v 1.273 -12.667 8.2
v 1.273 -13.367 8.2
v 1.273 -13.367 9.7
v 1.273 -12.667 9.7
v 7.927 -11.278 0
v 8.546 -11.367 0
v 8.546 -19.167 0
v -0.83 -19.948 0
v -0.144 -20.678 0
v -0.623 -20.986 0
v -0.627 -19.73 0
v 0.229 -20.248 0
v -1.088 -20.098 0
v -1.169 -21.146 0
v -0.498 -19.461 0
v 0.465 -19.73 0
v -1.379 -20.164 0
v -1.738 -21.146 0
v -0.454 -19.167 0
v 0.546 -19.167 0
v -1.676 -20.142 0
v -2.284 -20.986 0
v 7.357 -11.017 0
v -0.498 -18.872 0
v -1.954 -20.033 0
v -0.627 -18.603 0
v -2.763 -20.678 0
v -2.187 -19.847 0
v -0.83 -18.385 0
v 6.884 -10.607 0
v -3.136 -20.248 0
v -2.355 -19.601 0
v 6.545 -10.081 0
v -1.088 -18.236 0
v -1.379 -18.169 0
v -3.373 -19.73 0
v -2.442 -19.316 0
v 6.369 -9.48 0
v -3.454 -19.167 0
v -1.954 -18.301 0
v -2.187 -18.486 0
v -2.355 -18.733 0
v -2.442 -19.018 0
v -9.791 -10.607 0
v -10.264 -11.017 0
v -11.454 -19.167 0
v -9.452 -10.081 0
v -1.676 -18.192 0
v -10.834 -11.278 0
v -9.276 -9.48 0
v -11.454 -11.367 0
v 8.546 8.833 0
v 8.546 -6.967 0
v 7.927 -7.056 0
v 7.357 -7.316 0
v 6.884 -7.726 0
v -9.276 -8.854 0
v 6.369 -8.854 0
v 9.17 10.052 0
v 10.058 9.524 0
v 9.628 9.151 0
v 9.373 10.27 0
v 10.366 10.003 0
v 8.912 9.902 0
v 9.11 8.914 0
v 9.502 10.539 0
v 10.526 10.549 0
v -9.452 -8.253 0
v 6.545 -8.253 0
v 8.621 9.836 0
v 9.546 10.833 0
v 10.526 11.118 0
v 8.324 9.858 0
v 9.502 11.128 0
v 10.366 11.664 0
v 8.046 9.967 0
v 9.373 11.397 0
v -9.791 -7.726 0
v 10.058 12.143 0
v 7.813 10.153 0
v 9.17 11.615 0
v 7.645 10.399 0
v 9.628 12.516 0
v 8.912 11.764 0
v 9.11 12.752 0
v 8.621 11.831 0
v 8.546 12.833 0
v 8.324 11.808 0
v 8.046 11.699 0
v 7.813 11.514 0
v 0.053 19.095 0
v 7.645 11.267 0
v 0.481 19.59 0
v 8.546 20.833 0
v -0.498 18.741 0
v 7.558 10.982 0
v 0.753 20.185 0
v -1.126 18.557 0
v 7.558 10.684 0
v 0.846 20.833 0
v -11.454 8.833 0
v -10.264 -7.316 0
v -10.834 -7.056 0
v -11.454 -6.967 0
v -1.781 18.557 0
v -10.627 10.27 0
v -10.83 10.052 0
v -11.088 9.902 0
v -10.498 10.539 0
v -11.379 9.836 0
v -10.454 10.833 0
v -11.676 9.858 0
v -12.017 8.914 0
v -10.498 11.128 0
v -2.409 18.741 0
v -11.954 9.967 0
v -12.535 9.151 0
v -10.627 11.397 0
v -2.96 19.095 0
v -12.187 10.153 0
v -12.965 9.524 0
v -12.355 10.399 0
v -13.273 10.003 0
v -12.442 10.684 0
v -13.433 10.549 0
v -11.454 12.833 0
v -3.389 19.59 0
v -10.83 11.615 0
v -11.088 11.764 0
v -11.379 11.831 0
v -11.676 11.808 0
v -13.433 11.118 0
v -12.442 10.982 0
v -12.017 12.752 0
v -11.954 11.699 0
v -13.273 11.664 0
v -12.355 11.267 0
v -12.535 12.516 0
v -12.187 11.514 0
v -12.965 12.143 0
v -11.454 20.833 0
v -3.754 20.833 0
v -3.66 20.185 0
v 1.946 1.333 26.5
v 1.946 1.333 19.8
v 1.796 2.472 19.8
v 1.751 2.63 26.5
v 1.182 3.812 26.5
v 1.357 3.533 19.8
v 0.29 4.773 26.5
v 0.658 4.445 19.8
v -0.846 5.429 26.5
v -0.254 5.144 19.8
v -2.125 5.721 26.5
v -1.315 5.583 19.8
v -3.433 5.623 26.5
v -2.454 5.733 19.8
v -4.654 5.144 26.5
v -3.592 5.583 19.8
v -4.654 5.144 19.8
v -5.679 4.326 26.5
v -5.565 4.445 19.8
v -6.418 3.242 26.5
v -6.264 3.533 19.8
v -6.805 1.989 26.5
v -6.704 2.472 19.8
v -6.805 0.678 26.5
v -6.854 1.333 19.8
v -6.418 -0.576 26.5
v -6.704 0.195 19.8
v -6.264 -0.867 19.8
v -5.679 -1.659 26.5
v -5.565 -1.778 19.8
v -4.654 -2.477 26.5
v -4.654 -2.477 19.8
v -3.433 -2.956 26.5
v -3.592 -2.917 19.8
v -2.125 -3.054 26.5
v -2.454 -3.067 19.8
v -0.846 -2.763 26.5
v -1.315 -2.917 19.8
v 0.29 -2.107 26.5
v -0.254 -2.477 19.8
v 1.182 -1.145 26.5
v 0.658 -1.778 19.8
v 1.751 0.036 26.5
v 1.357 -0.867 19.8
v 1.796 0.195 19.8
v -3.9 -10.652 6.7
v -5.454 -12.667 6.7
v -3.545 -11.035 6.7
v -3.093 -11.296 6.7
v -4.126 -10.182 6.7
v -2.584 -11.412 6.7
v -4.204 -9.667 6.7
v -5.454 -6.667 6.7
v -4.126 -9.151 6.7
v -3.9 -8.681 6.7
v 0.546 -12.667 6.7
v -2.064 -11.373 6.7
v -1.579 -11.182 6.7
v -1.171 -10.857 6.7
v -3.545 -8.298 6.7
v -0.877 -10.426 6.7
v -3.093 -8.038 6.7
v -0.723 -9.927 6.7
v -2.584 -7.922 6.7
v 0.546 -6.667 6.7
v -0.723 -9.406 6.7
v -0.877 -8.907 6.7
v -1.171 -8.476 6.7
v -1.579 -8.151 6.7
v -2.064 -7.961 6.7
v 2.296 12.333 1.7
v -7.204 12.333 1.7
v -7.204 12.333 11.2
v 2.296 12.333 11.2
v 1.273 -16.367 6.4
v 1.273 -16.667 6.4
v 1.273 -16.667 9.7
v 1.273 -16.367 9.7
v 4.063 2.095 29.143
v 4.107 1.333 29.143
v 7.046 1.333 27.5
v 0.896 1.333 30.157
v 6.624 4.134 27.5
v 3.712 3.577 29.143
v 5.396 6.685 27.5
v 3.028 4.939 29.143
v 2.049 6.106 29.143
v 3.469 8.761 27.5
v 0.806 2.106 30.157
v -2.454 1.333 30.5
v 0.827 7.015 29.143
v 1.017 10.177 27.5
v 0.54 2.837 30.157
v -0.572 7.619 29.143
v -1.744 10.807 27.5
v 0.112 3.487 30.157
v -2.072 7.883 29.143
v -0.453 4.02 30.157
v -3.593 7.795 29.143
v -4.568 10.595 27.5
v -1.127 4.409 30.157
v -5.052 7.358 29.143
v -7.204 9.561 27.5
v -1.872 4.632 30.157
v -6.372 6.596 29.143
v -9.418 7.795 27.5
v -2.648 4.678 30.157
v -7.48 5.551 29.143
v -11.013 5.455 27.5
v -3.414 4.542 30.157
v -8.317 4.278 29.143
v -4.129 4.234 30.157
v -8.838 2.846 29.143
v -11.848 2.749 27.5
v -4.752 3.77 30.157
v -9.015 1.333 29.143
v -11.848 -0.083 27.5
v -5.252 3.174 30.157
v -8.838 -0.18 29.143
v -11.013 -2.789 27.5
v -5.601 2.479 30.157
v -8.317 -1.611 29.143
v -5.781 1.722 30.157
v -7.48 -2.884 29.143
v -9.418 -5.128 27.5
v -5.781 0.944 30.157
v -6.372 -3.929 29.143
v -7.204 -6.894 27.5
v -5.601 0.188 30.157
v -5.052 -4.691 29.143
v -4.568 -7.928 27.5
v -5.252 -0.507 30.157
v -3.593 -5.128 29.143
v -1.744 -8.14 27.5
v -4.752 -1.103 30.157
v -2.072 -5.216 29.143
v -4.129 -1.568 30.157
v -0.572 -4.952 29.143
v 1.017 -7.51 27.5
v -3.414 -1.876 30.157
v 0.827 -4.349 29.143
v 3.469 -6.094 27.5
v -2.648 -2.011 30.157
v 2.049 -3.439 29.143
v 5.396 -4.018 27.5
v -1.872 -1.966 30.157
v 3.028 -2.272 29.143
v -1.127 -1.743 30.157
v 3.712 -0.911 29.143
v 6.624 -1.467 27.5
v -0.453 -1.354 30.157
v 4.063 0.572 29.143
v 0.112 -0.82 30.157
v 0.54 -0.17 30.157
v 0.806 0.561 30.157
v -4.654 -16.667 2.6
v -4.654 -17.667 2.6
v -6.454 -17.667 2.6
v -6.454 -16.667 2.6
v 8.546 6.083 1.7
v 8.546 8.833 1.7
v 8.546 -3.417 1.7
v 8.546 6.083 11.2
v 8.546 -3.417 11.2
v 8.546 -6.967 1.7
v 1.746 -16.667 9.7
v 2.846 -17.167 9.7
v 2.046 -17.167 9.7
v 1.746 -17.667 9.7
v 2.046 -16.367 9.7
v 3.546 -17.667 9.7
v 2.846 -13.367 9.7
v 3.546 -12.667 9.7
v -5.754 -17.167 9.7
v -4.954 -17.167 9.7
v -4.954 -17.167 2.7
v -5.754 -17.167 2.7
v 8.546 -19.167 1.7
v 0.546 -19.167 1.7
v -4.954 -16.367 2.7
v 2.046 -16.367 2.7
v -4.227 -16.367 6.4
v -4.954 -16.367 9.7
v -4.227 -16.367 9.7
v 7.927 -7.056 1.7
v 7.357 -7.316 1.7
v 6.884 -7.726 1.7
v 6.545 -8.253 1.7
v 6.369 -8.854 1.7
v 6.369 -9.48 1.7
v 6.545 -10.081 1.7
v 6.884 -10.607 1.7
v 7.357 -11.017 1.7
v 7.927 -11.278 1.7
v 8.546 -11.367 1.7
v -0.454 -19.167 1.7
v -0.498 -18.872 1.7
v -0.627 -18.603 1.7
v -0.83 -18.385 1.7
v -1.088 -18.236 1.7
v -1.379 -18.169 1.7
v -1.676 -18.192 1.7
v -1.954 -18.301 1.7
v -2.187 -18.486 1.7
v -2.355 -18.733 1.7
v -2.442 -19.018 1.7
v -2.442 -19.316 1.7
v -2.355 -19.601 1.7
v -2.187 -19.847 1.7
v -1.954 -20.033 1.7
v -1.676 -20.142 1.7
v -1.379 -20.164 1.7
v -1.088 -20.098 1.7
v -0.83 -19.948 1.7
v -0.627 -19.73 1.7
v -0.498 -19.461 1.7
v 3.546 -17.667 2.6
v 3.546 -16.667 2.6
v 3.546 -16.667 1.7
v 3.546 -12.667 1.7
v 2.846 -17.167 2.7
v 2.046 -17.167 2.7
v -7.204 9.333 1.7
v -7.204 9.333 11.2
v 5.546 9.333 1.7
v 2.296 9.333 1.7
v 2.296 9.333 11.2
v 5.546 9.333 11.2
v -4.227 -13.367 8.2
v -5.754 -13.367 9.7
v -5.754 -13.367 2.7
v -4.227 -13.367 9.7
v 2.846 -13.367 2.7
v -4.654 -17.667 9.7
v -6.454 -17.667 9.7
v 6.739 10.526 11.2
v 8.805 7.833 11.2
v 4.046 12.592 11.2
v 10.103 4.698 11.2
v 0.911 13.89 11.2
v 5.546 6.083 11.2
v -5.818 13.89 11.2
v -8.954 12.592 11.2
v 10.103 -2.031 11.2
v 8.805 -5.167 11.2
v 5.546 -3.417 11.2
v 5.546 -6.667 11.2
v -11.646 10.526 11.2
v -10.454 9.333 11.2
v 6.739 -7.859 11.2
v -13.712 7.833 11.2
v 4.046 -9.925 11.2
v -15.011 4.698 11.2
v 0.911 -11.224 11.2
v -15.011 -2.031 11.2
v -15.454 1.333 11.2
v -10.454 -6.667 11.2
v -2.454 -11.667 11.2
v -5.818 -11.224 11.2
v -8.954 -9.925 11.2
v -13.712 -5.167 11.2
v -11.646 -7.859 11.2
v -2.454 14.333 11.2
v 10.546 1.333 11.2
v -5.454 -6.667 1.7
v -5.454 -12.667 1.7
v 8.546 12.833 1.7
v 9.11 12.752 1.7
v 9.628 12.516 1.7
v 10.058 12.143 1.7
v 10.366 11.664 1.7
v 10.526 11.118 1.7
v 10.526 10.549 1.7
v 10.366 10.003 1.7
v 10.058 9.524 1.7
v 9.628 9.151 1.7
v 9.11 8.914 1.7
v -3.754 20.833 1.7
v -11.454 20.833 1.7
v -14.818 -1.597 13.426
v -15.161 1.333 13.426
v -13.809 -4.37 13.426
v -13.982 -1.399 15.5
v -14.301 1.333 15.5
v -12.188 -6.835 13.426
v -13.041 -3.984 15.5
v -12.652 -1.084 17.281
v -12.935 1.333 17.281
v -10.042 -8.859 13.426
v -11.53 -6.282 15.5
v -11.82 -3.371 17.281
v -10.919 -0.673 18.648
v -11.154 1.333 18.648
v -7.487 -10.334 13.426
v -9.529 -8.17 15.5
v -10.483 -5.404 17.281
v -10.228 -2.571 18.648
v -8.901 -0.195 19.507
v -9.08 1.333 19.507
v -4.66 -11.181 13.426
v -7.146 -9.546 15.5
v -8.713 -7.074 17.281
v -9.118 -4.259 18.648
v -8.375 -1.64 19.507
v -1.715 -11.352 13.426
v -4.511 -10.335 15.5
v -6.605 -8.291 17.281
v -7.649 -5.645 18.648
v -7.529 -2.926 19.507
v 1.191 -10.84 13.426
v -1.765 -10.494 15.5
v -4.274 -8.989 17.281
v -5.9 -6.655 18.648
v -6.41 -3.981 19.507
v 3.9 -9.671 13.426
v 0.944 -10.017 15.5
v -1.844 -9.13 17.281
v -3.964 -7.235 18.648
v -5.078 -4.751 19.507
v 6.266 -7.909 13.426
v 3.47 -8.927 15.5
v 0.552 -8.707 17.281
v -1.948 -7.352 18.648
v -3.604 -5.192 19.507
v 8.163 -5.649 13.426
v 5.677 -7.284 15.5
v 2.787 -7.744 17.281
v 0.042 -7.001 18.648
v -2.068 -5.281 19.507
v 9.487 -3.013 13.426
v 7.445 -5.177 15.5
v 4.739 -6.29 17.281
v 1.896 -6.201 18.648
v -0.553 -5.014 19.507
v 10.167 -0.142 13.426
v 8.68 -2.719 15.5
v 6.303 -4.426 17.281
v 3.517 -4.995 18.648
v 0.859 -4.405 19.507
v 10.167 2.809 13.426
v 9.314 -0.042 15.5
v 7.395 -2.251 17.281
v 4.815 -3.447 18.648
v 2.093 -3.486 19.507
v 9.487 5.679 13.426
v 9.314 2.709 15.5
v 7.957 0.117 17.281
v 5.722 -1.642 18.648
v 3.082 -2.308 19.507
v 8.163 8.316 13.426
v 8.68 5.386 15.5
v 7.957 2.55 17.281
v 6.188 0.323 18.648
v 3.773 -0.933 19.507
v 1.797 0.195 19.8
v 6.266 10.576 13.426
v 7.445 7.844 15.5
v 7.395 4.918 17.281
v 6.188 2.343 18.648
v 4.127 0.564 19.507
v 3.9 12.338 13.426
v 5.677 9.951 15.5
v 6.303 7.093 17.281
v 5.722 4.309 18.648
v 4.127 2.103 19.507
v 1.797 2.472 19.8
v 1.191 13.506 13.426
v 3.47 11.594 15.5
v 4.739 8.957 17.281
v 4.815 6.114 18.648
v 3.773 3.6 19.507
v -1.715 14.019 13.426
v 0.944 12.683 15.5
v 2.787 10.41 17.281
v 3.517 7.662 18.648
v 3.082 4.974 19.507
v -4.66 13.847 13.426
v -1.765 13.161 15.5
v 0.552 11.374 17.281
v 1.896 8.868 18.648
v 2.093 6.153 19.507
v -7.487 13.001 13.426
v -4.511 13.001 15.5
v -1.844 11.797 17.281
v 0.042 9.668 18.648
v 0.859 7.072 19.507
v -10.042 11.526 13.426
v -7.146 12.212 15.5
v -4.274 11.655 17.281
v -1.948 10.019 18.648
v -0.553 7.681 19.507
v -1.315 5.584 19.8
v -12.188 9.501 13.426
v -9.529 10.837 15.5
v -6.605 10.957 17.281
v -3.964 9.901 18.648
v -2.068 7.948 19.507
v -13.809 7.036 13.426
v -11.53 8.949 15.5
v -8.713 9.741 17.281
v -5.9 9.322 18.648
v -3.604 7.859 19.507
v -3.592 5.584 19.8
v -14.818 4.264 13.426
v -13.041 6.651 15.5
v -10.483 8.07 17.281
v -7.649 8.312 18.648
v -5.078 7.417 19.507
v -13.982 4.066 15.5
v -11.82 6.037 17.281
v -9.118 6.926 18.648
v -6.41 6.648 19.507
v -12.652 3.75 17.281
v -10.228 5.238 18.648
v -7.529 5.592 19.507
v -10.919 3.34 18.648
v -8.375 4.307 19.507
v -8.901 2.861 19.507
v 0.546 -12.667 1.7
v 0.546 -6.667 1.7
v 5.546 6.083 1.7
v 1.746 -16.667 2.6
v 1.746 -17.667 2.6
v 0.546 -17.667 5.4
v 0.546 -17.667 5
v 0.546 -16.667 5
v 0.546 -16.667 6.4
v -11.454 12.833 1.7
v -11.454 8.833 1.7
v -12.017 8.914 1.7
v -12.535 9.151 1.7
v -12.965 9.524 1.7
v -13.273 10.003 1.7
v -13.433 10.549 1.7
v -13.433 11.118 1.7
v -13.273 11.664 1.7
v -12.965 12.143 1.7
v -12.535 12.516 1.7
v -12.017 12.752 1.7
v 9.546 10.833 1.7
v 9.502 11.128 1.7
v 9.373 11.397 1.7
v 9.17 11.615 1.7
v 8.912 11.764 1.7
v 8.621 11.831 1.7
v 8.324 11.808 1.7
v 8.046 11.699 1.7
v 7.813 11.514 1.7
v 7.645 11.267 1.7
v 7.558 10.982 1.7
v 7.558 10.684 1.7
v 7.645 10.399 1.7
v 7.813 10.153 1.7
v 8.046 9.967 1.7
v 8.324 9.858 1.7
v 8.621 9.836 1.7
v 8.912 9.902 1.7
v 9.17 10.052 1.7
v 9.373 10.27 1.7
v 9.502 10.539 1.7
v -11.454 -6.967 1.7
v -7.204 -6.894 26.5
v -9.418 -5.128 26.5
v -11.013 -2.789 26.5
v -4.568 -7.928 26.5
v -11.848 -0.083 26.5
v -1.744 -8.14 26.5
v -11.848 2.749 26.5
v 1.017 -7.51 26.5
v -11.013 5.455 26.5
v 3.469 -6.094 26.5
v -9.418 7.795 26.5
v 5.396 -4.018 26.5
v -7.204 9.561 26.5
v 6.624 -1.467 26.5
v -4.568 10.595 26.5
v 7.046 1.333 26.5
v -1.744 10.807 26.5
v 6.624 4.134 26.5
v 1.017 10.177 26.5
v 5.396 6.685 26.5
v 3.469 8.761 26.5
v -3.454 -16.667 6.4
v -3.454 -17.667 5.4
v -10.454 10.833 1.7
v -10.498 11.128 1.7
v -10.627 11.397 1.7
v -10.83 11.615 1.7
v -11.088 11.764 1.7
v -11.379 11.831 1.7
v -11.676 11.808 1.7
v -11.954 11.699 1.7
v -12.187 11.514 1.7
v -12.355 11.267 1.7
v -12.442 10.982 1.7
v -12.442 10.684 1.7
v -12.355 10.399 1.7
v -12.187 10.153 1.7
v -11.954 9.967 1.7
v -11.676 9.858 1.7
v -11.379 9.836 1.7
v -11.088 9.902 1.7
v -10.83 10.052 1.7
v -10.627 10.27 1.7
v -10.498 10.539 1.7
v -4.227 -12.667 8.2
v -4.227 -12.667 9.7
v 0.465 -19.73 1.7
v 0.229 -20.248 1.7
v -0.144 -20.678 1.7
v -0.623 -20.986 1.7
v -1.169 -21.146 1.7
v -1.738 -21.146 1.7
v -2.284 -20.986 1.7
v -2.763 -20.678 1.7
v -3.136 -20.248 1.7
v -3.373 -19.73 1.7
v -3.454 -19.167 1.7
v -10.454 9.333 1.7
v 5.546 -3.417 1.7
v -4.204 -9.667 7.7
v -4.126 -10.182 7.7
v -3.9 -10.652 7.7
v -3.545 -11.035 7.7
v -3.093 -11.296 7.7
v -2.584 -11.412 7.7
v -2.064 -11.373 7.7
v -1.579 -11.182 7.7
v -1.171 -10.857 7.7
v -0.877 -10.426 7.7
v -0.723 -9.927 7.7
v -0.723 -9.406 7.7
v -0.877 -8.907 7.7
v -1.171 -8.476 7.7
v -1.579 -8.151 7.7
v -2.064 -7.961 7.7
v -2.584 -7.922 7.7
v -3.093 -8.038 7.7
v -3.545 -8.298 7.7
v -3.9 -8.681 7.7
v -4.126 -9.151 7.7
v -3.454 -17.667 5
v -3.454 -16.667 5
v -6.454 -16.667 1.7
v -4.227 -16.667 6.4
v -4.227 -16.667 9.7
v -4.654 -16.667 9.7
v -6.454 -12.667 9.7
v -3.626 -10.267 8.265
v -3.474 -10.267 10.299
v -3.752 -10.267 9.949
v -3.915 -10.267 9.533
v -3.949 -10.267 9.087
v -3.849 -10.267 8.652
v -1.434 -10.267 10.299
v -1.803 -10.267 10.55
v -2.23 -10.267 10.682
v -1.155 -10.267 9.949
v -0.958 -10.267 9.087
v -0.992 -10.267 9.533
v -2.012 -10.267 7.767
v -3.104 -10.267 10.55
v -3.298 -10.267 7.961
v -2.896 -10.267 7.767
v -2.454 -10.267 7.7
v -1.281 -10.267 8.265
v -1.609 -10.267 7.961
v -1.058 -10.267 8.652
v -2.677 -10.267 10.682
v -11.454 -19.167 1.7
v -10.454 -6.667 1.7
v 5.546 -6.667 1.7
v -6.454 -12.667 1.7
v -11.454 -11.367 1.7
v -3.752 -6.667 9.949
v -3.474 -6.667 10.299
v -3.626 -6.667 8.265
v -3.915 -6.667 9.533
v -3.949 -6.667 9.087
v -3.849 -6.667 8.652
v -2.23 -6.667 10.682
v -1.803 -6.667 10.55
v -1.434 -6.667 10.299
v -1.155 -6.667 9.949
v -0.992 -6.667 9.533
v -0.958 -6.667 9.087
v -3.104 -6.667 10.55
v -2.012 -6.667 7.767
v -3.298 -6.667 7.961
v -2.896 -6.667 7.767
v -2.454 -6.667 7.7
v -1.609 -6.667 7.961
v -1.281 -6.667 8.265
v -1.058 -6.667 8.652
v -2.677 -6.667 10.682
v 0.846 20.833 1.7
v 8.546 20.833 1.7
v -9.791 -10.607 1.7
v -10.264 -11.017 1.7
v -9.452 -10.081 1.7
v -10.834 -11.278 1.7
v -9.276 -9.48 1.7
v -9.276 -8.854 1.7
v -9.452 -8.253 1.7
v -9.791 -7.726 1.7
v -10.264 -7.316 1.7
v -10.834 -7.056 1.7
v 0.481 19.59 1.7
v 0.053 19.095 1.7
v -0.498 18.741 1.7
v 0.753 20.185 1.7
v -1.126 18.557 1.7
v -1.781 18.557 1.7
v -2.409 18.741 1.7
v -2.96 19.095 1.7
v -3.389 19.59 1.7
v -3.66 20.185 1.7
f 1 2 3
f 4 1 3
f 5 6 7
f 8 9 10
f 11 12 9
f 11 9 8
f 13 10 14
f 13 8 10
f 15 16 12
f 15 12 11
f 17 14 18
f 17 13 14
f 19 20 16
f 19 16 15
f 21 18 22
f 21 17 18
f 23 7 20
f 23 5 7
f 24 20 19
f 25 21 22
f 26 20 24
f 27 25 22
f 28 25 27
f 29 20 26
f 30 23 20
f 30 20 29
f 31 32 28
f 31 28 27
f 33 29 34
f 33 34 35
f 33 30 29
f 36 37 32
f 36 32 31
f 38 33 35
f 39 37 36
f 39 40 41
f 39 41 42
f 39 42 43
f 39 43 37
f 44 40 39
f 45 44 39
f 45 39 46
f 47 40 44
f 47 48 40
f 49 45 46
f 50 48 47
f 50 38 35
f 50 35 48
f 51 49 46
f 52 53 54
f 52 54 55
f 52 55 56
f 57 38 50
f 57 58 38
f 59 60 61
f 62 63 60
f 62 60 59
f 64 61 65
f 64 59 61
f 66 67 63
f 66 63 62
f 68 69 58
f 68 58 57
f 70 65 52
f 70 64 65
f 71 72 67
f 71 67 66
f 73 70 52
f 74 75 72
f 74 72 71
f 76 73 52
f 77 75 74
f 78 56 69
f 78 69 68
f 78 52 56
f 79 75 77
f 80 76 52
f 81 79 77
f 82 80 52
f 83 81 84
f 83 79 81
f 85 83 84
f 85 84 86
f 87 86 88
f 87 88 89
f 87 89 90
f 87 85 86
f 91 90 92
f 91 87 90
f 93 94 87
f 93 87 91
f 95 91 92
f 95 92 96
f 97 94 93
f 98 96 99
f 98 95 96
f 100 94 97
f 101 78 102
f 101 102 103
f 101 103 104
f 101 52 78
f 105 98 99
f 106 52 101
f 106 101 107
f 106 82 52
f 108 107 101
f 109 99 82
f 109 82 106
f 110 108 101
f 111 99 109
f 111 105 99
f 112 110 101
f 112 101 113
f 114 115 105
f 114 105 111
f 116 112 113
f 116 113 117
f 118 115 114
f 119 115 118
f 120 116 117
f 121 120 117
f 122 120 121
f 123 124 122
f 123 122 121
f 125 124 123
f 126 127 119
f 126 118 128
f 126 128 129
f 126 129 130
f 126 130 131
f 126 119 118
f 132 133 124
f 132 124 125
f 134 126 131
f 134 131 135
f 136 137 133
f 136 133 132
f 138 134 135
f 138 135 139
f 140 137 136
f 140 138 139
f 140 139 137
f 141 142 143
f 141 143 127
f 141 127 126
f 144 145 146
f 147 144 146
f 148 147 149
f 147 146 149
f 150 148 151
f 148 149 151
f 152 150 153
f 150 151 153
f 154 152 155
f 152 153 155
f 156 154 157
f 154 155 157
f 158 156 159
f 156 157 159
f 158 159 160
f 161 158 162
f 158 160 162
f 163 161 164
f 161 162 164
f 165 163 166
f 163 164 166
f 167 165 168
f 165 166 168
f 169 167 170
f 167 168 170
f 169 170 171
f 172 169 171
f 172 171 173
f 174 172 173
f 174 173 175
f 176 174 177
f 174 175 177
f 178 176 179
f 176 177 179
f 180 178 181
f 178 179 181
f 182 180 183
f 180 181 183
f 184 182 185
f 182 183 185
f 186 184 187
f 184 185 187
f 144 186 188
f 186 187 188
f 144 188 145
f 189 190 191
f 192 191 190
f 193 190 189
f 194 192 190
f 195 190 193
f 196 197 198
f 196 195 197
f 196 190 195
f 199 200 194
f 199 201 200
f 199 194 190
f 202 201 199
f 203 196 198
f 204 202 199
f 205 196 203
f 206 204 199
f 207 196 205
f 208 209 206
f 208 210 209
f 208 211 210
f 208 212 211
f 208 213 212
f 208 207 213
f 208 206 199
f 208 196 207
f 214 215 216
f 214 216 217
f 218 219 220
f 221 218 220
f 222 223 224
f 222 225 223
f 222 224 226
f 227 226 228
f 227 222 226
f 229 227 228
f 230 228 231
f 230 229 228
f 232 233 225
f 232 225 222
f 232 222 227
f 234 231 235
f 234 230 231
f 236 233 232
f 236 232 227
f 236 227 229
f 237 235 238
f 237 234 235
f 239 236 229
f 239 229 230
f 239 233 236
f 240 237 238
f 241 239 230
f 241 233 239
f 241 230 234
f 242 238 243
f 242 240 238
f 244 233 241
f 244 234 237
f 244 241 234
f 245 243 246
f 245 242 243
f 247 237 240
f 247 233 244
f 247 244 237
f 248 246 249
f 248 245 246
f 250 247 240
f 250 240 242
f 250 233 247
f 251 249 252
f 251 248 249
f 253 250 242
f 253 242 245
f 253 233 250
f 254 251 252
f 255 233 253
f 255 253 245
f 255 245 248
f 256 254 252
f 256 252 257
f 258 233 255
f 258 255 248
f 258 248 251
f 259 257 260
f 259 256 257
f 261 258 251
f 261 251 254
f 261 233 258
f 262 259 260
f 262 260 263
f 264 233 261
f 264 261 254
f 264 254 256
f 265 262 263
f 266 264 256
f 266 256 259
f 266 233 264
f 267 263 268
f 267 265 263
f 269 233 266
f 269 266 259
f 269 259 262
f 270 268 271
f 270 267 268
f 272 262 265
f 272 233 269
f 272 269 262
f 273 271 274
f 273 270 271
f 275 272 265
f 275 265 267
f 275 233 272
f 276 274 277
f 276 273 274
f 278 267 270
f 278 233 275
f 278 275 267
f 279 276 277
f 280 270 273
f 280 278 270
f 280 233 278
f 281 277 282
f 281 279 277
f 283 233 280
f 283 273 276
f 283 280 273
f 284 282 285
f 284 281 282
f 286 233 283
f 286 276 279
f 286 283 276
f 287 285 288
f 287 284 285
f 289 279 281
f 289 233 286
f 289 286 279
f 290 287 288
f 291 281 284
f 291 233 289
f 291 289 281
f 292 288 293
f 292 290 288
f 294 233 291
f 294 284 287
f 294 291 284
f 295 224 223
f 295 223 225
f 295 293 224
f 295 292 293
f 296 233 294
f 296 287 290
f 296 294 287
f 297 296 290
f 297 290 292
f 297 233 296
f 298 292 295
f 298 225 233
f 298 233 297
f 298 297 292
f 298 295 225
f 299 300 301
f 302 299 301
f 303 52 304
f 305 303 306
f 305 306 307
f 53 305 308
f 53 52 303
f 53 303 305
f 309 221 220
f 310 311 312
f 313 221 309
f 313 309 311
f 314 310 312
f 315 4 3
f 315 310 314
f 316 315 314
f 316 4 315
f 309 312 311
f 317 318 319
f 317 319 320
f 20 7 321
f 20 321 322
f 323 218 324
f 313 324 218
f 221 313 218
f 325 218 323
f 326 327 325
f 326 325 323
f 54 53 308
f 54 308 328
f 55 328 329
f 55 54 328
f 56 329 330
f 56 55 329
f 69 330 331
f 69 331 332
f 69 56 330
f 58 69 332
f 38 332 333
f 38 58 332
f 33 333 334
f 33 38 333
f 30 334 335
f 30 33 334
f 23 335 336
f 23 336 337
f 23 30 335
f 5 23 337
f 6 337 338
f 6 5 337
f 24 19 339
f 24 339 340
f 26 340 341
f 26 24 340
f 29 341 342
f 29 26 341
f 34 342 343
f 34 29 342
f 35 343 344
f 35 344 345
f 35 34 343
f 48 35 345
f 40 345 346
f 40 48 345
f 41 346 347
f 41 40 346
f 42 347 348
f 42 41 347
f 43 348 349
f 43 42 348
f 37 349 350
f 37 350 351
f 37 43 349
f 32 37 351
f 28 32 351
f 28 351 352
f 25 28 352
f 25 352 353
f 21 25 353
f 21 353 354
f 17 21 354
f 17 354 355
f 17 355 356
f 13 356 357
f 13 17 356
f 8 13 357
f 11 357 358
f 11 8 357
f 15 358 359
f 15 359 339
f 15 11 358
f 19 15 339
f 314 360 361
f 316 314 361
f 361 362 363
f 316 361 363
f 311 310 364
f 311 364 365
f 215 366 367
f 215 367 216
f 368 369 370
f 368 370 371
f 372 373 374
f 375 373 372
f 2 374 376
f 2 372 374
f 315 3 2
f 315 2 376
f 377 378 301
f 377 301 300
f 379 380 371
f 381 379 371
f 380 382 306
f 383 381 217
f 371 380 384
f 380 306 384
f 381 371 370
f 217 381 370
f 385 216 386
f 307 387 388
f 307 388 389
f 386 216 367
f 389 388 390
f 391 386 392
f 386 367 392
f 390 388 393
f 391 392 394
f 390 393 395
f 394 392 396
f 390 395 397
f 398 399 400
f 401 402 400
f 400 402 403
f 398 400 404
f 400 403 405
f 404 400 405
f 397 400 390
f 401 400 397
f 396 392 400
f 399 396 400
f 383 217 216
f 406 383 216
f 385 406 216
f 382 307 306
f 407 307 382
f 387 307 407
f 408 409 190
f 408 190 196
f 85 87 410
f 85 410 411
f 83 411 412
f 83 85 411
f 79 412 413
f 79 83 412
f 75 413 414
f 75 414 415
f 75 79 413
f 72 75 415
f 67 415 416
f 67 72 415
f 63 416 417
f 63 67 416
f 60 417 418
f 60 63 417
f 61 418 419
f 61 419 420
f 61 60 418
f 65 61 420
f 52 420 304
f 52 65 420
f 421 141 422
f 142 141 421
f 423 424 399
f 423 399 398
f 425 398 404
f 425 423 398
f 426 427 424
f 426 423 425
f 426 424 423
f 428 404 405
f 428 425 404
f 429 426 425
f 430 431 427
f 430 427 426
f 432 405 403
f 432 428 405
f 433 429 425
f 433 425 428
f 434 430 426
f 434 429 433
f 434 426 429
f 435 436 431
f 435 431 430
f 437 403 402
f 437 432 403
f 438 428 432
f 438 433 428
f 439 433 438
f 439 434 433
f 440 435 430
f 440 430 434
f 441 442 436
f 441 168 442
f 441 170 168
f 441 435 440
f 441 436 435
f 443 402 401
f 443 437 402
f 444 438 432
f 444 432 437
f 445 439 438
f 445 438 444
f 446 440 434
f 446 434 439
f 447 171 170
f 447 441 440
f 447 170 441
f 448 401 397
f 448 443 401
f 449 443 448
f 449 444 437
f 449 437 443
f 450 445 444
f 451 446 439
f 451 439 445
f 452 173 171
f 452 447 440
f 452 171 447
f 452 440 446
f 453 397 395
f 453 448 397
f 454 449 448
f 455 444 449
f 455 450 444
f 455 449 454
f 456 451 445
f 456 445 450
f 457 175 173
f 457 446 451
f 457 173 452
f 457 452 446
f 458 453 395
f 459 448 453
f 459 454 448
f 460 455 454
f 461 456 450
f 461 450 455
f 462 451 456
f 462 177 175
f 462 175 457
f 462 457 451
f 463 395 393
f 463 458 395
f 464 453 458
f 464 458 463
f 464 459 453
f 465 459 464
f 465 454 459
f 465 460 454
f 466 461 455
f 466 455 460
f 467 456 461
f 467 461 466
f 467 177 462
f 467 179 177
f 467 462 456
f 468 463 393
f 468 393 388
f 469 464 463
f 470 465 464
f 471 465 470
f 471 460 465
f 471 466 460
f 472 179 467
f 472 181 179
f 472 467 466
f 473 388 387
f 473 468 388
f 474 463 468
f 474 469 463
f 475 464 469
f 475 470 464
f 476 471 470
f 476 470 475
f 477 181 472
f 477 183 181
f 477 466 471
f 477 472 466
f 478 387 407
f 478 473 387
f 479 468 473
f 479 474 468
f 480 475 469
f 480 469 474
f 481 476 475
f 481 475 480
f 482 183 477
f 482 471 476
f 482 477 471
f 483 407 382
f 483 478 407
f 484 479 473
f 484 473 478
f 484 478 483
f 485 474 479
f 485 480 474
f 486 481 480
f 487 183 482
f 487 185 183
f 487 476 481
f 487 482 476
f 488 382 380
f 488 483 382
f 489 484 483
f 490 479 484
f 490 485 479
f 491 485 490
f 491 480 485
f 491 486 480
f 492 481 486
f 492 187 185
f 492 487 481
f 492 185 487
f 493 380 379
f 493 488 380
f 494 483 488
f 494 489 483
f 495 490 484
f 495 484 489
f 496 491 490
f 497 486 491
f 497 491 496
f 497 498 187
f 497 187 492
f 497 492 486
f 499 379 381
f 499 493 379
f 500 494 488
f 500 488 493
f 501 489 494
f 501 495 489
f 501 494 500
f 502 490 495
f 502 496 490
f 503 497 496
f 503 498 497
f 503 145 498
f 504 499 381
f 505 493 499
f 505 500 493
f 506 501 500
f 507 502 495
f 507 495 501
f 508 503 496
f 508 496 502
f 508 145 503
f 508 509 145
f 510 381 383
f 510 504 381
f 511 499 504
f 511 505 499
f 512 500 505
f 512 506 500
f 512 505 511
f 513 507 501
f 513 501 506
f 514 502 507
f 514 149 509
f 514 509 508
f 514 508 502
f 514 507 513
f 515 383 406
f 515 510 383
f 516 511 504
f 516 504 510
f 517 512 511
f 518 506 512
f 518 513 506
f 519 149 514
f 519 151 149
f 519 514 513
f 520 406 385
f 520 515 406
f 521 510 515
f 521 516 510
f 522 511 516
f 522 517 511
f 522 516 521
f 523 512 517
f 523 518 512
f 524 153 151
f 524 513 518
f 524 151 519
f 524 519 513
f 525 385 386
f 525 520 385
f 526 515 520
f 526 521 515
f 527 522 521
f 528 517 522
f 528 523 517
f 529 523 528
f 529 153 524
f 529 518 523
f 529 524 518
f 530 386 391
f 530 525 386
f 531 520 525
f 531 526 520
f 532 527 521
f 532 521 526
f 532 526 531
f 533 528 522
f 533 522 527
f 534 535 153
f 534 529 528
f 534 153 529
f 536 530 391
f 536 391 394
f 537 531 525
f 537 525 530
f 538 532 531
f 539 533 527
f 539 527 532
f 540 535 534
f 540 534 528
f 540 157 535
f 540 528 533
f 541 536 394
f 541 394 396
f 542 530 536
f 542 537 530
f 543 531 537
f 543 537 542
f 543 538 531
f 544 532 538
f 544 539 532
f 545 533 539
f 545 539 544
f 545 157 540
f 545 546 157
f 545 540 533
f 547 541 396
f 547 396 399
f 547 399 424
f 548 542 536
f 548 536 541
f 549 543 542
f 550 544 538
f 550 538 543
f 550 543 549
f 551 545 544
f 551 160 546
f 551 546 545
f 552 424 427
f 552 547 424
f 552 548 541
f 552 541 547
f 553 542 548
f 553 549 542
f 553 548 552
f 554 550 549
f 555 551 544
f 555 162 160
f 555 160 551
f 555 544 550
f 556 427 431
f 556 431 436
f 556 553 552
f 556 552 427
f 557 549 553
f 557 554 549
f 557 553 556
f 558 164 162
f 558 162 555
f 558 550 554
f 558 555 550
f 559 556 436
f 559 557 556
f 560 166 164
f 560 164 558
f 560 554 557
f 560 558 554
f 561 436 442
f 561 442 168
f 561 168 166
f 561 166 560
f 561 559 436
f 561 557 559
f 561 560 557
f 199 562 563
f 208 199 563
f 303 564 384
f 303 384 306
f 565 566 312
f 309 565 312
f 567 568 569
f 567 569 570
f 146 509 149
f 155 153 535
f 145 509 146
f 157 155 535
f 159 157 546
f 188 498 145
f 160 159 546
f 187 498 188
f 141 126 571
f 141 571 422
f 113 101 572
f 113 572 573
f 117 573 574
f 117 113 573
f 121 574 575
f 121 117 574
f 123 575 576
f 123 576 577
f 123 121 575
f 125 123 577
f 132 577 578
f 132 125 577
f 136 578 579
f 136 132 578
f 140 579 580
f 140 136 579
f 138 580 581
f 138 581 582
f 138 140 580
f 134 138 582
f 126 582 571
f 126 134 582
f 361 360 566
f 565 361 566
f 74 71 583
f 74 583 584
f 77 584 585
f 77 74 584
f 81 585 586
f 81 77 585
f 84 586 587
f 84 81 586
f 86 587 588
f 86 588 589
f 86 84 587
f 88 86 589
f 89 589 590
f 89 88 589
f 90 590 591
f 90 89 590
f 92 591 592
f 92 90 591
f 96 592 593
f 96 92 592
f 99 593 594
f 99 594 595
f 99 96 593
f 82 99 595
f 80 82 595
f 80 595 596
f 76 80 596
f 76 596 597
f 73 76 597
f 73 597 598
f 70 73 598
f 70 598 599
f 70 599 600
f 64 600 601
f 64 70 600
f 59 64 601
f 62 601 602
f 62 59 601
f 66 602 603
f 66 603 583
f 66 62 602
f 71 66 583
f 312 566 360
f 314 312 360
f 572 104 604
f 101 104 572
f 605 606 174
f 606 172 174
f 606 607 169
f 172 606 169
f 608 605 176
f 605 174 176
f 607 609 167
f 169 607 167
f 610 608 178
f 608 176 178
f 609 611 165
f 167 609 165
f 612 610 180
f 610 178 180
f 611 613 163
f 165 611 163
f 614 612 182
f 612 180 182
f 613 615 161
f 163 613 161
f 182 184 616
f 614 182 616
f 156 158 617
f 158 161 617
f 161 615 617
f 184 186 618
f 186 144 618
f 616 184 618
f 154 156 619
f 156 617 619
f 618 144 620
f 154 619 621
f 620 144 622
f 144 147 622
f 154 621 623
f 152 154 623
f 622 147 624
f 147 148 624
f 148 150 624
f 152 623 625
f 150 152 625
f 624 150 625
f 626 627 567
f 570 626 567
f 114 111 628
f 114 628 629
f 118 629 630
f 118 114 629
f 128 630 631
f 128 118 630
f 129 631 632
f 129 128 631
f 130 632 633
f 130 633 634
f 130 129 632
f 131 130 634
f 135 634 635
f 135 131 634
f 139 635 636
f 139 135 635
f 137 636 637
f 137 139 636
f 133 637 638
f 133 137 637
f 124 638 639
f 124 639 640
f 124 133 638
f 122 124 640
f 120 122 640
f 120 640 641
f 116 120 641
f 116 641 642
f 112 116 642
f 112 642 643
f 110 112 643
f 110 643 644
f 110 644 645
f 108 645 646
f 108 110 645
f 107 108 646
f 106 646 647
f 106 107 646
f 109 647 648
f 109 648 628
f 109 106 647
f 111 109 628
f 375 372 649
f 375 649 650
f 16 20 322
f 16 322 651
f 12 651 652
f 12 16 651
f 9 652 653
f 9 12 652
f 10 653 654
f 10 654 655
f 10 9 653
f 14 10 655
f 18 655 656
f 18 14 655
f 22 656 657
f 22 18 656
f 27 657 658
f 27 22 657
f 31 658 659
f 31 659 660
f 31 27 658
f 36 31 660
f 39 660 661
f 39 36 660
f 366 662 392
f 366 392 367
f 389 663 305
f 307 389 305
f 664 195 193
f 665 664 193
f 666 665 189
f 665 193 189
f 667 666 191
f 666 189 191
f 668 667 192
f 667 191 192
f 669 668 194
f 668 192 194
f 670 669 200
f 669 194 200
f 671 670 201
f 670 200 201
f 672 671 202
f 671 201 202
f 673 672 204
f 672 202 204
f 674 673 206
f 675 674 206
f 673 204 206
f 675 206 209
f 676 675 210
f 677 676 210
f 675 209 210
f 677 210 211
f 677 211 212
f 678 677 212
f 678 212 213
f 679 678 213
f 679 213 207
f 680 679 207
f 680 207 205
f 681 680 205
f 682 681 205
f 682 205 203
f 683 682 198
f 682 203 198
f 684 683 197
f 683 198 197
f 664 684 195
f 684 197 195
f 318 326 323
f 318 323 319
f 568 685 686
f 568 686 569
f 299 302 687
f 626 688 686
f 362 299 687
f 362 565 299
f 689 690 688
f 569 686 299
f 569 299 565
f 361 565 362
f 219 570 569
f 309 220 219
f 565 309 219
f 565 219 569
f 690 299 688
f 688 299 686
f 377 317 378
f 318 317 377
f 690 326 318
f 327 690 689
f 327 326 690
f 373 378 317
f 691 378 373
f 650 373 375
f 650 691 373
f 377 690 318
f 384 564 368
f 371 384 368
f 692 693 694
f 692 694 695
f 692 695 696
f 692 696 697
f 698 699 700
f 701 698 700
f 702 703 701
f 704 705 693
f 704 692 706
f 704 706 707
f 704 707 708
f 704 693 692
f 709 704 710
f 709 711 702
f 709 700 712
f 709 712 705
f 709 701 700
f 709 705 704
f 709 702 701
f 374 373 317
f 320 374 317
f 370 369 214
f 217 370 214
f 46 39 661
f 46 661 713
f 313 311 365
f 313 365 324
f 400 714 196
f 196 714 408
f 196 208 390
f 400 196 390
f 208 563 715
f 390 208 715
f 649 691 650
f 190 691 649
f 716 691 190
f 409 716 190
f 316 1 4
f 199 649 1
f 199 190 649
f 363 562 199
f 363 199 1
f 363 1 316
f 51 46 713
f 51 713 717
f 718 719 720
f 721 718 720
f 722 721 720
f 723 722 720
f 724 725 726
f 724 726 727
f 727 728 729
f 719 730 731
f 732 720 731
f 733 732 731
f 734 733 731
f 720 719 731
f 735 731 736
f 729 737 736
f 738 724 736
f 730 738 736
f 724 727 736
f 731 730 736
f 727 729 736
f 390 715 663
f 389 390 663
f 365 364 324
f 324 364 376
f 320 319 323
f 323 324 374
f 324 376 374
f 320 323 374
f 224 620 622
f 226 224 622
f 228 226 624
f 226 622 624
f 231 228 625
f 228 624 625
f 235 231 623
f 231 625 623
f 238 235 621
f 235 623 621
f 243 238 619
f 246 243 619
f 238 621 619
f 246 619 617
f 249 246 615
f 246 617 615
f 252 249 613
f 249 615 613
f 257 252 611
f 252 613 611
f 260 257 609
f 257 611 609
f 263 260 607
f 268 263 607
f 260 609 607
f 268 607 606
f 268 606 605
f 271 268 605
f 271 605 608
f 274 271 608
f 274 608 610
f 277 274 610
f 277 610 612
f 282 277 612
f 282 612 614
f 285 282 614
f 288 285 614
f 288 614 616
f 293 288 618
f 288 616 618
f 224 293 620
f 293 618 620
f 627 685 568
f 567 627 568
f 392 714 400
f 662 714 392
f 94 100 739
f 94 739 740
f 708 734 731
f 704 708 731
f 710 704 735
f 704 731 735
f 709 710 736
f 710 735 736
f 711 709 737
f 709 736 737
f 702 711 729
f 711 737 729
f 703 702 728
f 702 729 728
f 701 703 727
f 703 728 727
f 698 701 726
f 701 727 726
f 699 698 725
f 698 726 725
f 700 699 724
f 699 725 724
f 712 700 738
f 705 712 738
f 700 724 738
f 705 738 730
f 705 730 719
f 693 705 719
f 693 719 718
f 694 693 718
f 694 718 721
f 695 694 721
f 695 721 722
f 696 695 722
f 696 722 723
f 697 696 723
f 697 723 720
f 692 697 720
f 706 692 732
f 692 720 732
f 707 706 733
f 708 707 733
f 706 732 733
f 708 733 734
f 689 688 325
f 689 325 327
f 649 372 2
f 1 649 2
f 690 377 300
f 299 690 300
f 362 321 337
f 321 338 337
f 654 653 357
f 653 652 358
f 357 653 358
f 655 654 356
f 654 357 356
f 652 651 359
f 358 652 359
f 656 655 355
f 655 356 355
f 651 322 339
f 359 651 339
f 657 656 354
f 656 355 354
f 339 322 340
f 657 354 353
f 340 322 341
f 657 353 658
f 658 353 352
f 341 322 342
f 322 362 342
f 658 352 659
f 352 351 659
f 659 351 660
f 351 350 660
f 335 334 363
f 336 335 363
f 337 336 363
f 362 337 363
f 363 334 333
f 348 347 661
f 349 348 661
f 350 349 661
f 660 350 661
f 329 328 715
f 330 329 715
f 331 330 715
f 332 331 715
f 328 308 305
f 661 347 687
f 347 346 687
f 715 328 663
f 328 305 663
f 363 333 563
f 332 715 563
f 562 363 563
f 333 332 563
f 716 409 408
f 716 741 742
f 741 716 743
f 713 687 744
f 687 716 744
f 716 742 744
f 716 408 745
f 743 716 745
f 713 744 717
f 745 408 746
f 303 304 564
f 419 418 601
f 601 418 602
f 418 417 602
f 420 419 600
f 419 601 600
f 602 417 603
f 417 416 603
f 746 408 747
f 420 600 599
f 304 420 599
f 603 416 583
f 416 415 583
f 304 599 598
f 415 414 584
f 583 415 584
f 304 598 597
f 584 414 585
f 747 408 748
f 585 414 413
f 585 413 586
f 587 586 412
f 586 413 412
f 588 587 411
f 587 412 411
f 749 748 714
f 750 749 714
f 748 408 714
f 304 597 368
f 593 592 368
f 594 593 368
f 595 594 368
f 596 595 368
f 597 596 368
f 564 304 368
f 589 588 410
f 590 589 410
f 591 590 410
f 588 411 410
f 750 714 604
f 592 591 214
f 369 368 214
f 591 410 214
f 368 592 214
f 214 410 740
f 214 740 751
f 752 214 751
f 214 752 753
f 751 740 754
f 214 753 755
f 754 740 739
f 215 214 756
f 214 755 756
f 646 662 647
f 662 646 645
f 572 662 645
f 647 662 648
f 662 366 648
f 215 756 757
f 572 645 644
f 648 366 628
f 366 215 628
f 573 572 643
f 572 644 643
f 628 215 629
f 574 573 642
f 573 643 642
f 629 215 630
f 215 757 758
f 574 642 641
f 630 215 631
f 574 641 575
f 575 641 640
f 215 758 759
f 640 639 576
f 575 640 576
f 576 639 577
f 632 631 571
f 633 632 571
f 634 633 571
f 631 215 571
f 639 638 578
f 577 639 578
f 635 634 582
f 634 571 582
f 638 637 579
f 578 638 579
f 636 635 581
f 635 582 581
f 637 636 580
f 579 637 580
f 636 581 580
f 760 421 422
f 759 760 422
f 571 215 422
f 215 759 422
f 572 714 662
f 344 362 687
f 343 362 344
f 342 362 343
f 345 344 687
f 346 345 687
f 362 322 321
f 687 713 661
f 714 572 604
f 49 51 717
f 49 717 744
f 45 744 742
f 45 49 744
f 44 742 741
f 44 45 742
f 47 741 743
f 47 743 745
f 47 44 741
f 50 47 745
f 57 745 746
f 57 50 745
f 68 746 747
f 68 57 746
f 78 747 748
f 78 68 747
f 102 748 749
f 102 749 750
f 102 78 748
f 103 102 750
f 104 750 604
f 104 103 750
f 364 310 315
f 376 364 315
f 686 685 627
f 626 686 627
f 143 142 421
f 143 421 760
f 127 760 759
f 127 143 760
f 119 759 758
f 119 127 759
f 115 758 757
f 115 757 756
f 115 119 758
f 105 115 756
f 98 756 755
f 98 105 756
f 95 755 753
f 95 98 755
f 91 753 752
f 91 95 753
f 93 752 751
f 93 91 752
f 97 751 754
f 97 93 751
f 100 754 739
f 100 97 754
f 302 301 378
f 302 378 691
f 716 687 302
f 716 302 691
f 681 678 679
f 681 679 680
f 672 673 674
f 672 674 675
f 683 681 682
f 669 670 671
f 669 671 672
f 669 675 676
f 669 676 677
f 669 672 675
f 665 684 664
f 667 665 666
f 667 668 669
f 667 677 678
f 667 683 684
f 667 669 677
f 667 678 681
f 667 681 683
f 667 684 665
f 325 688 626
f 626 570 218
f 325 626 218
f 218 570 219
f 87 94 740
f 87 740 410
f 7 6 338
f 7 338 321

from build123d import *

# Parameters (mm, degrees)
ESQUISSE1_R             = 1
BOSS_EXTRU_1_DEPTH      = 1.7
ESQUISSE2_W             = 10
ESQUISSE2_H             = 5
BOSS_EXTRU_2_DEPTH      = 8
ESQUISSE3_W             = 4
ESQUISSE3_H             = 1.4
ENL_V_MAT_EXTRU_1_DEPTH = 1
CHANFREIN2_SIZE         = 1
ESQUISSE4_W             = 5.5
ESQUISSE4_H             = 3.3
ENL_V_MAT_EXTRU_2_DEPTH = 1
ESQUISSE5_W             = 5.5
ESQUISSE5_H             = 1.5
ENL_V_MAT_EXTRU_3_DEPTH = 11
ENL_V_MAT_EXTRU_4_DEPTH = 7
ESQUISSE7_W             = 6
ESQUISSE7_H             = 6
BOSS_EXTRU_3_DEPTH      = 5
ESQUISSE8_R             = 1.75
BOSS_EXTRU_4_DEPTH      = 1
ESQUISSE9_W             = 16
ESQUISSE9_H             = 16
BOSS_EXTRU_5_DEPTH      = 12
ESQUISSE10_W            = 9.5
ESQUISSE10_H            = 3
ESQUISSE10_W_2          = 3
ESQUISSE10_H_2          = 9.5
BOSS_EXTRU_6_DEPTH      = 12
ESQUISSE12_W            = 32.197385869
ESQUISSE12_H            = 22.732769694
ENL_V_MAT_EXTRU_5_DEPTH = 2.5
ESQUISSE13_R            = 13
BOSS_EXTRU_7_DEPTH      = 8.6
CONG_1_R                = 8.6
ESQUISSE14_R            = 4.4
BOSS_EXTRU_8_DEPTH      = 6.7
ESQUISSE15_R            = 9.5
BOSS_EXTRU_9_DEPTH      = 1
D_ME1_FACE_RADIUS       = 9.5
D_ME1_HEIGHT            = 3
ESQUISSE18_R            = 1.499413023
BOSS_EXTRU_11_DEPTH     = 3.6


with BuildPart() as part:
    # Esquisse1 → Boss.-Extru.1 (new body)
    with BuildSketch(Plane.XY):
        with BuildLine():
            Line((-11.45365733, 20.833333333), (-3.75365733, 20.833333333))
            ThreePointArc((-3.75365733, 20.833333333), (-1.45365733, 18.533333333), (0.84634267, 20.833333333))
            Line((0.84634267, 20.833333333), (8.54634267, 20.833333333))
            Line((8.54634267, 20.833333333), (8.54634267, 12.833333333))
            ThreePointArc((8.54634267, 12.833333333), (10.54634267, 10.833333333), (8.54634267, 8.833333333))
            Line((8.54634267, 8.833333333), (8.54634267, -6.966666667))
            ThreePointArc((8.54634267, -6.966666667), (6.34634267, -9.166666667), (8.54634267, -11.366666667))
            Line((8.54634267, -11.366666667), (8.54634267, -19.166666667))
            Line((8.54634267, -19.166666667), (0.54634267, -19.166666667))
            ThreePointArc((0.54634267, -19.166666667), (-1.45365733, -21.166666667), (-3.45365733, -19.166666667))
            Line((-3.45365733, -19.166666667), (-11.45365733, -19.166666667))
            Line((-11.45365733, -19.166666667), (-11.45365733, -11.366666667))
            ThreePointArc((-11.45365733, -11.366666667), (-9.25365733, -9.166666667), (-11.45365733, -6.966666667))
            Line((-11.45365733, -6.966666667), (-11.45365733, 8.833333333))
            ThreePointArc((-11.45365733, 8.833333333), (-13.45365733, 10.833333333), (-11.45365733, 12.833333333))
            Line((-11.45365733, 12.833333333), (-11.45365733, 20.833333333))
        make_face()
        with Locations((-11.45365733, 10.833333333)):
            Circle(ESQUISSE1_R, mode=Mode.SUBTRACT)
        with Locations((8.54634267, 10.833333333)):
            Circle(ESQUISSE1_R, mode=Mode.SUBTRACT)
        with Locations((-1.45365733, -19.166666667)):
            Circle(ESQUISSE1_R, mode=Mode.SUBTRACT)
    extrude(amount=BOSS_EXTRU_1_DEPTH)

    # Esquisse2 → Boss.-Extru.2 (add)
    with BuildSketch(Plane.XY.offset(1.7)):
        with Locations((-1.45365733, -15.166666667)):
            Rectangle(ESQUISSE2_W, ESQUISSE2_H)
    extrude(amount=BOSS_EXTRU_2_DEPTH)

    # Esquisse3 → Enlèv. mat.-Extru.1 (cut)
    with BuildSketch(Plane.XZ.offset(17.666666667)):
        Polygon((-6.45365733, 1.7), (3.54634267, 1.7), (3.54634267, 2.6), (1.74634267, 2.6), (1.74634267, 9.7), (-4.65365733, 9.7), (-4.65365733, 2.6), (-6.45365733, 2.6), align=None)
        with Locations((-1.45365733, 5.7)):
            Rectangle(ESQUISSE3_W, ESQUISSE3_H, mode=Mode.SUBTRACT)
    extrude(amount=-ENL_V_MAT_EXTRU_1_DEPTH, mode=Mode.SUBTRACT)

    # Chanfrein2
    chanfrein2_edges = [part.edges().sort_by_distance(p)[0] for p in [
        (-1.45365733, -17.666666667, 6.4),
    ]]
    chamfer(chanfrein2_edges, length=CHANFREIN2_SIZE - 0.0001)  # a hair under: the kernel refuses the full size

    # Esquisse4 → Enlèv. mat.-Extru.2 (cut)
    with BuildSketch(Plane.XZ.offset(16.666666667)):
        with Locations((-1.476758853, 8.05)):
            Rectangle(ESQUISSE4_W, ESQUISSE4_H)
    extrude(amount=-ENL_V_MAT_EXTRU_2_DEPTH, mode=Mode.SUBTRACT)

    # Esquisse5 → Enlèv. mat.-Extru.3 (cut)
    with BuildSketch(Plane.XZ.offset(15.666666667)):
        with Locations((-1.476758853, 8.95)):
            Rectangle(ESQUISSE5_W, ESQUISSE5_H)
    extrude(amount=-ENL_V_MAT_EXTRU_3_DEPTH, mode=Mode.SUBTRACT)

    # Esquisse6 → Enlèv. mat.-Extru.4 (cut)
    with BuildSketch(Plane.XY.offset(9.7)):
        Polygon((-5.75365733, -13.366666667), (2.84634267, -13.366666667), (2.84634267, -16.366666667), (2.84634267, -17.166666667), (2.04634267, -17.166666667), (2.04634267, -16.366666667), (-4.95365733, -16.366666667), (-4.95365733, -17.166666667), (-5.75365733, -17.166666667), (-5.75365733, -16.366666667), align=None)
    extrude(amount=-ENL_V_MAT_EXTRU_4_DEPTH, mode=Mode.SUBTRACT)

    # Esquisse7 → Boss.-Extru.3 (add)
    with BuildSketch(Plane.XY.offset(1.7)):
        with Locations((-2.45365733, -9.666666667)):
            Rectangle(ESQUISSE7_W, ESQUISSE7_H)
    extrude(amount=BOSS_EXTRU_3_DEPTH)

    # Esquisse8 → Boss.-Extru.4 (add)
    with BuildSketch(Plane.XY.offset(6.7)):
        with Locations(Location((-2.45365733, -9.666666667, 0), (0, 0, 180))):
            Circle(ESQUISSE8_R)
    extrude(amount=BOSS_EXTRU_4_DEPTH)

    # Esquisse9 → Boss.-Extru.5 (add)
    with BuildSketch(Plane.XY.offset(1.7)):
        with Locations((-2.45365733, 1.333333333)):
            Rectangle(ESQUISSE9_W, ESQUISSE9_H)
    extrude(amount=BOSS_EXTRU_5_DEPTH)

    # Esquisse10 → Boss.-Extru.6 (add)
    with BuildSketch(Plane.XY.offset(1.7)):
        with Locations((-2.45365733, 10.833333333)):
            Rectangle(ESQUISSE10_W, ESQUISSE10_H)
        with Locations((7.04634267, 1.333333333)):
            Rectangle(ESQUISSE10_W_2, ESQUISSE10_H_2)
    extrude(amount=BOSS_EXTRU_6_DEPTH)

    # Esquisse12 → Enlèv. mat.-Extru.5 (cut)
    with BuildSketch(Plane.XY.offset(13.7)):
        with Locations((-0.834476833, 3.194598891)):
            Rectangle(ESQUISSE12_W, ESQUISSE12_H)
    extrude(amount=-ENL_V_MAT_EXTRU_5_DEPTH, mode=Mode.SUBTRACT)

    # Esquisse13 → Boss.-Extru.7 (add)
    with BuildSketch(Plane.XY.offset(11.2)):
        with Locations(Location((-2.45365733, 1.333333333, 0), (0, 0, 180))):
            Circle(ESQUISSE13_R)
    extrude(amount=BOSS_EXTRU_7_DEPTH)

    # Congé1
    cong_1_edges = [part.edges().sort_by_distance(p)[0] for p in [
        (10.54634267, 1.333333333, 19.8),
    ]]
    fillet(cong_1_edges, radius=CONG_1_R - 0.0001)  # a hair under: the kernel refuses the full size

    # Esquisse14 → Boss.-Extru.8 (add)
    with BuildSketch(Plane.XY.offset(19.8)):
        with Locations((-2.45365733, 1.333333333)):
            Circle(ESQUISSE14_R)
    extrude(amount=BOSS_EXTRU_8_DEPTH)

    # Esquisse15 → Boss.-Extru.9 (add)
    with BuildSketch(Plane.XY.offset(26.5)):
        with Locations((-2.45365733, 1.333333333)):
            Circle(ESQUISSE15_R)
    extrude(amount=BOSS_EXTRU_9_DEPTH)

    # Dôme1: a dome of height H over a round flat face of radius A is a cap of a sphere of radius (A * A + H * H) / (2 * H)
    d_me1_r = (D_ME1_FACE_RADIUS * D_ME1_FACE_RADIUS + D_ME1_HEIGHT * D_ME1_HEIGHT) / (2 * D_ME1_HEIGHT)
    d_me1_base = Plane((-2.45365733, 1.333333333, 27.5), z_dir=(0, 0, 1))
    with Locations(d_me1_base.offset(D_ME1_HEIGHT - d_me1_r)):
        d_me1_ball = Sphere(d_me1_r, mode=Mode.PRIVATE)
    add(split(d_me1_ball, bisect_by=d_me1_base, keep=Keep.TOP, mode=Mode.PRIVATE))


with BuildPart() as body_2:
    # Esquisse18 → Boss.-Extru.11 (new body)
    with BuildSketch(Plane.XZ.offset(6.666666667)):
        with Locations(Location((-2.45365733, 9.199413023, 0), (0, 0, 270))):
            Circle(ESQUISSE18_R)
    extrude(amount=BOSS_EXTRU_11_DEPTH)


solid = Compound([part.part, body_2.part])
